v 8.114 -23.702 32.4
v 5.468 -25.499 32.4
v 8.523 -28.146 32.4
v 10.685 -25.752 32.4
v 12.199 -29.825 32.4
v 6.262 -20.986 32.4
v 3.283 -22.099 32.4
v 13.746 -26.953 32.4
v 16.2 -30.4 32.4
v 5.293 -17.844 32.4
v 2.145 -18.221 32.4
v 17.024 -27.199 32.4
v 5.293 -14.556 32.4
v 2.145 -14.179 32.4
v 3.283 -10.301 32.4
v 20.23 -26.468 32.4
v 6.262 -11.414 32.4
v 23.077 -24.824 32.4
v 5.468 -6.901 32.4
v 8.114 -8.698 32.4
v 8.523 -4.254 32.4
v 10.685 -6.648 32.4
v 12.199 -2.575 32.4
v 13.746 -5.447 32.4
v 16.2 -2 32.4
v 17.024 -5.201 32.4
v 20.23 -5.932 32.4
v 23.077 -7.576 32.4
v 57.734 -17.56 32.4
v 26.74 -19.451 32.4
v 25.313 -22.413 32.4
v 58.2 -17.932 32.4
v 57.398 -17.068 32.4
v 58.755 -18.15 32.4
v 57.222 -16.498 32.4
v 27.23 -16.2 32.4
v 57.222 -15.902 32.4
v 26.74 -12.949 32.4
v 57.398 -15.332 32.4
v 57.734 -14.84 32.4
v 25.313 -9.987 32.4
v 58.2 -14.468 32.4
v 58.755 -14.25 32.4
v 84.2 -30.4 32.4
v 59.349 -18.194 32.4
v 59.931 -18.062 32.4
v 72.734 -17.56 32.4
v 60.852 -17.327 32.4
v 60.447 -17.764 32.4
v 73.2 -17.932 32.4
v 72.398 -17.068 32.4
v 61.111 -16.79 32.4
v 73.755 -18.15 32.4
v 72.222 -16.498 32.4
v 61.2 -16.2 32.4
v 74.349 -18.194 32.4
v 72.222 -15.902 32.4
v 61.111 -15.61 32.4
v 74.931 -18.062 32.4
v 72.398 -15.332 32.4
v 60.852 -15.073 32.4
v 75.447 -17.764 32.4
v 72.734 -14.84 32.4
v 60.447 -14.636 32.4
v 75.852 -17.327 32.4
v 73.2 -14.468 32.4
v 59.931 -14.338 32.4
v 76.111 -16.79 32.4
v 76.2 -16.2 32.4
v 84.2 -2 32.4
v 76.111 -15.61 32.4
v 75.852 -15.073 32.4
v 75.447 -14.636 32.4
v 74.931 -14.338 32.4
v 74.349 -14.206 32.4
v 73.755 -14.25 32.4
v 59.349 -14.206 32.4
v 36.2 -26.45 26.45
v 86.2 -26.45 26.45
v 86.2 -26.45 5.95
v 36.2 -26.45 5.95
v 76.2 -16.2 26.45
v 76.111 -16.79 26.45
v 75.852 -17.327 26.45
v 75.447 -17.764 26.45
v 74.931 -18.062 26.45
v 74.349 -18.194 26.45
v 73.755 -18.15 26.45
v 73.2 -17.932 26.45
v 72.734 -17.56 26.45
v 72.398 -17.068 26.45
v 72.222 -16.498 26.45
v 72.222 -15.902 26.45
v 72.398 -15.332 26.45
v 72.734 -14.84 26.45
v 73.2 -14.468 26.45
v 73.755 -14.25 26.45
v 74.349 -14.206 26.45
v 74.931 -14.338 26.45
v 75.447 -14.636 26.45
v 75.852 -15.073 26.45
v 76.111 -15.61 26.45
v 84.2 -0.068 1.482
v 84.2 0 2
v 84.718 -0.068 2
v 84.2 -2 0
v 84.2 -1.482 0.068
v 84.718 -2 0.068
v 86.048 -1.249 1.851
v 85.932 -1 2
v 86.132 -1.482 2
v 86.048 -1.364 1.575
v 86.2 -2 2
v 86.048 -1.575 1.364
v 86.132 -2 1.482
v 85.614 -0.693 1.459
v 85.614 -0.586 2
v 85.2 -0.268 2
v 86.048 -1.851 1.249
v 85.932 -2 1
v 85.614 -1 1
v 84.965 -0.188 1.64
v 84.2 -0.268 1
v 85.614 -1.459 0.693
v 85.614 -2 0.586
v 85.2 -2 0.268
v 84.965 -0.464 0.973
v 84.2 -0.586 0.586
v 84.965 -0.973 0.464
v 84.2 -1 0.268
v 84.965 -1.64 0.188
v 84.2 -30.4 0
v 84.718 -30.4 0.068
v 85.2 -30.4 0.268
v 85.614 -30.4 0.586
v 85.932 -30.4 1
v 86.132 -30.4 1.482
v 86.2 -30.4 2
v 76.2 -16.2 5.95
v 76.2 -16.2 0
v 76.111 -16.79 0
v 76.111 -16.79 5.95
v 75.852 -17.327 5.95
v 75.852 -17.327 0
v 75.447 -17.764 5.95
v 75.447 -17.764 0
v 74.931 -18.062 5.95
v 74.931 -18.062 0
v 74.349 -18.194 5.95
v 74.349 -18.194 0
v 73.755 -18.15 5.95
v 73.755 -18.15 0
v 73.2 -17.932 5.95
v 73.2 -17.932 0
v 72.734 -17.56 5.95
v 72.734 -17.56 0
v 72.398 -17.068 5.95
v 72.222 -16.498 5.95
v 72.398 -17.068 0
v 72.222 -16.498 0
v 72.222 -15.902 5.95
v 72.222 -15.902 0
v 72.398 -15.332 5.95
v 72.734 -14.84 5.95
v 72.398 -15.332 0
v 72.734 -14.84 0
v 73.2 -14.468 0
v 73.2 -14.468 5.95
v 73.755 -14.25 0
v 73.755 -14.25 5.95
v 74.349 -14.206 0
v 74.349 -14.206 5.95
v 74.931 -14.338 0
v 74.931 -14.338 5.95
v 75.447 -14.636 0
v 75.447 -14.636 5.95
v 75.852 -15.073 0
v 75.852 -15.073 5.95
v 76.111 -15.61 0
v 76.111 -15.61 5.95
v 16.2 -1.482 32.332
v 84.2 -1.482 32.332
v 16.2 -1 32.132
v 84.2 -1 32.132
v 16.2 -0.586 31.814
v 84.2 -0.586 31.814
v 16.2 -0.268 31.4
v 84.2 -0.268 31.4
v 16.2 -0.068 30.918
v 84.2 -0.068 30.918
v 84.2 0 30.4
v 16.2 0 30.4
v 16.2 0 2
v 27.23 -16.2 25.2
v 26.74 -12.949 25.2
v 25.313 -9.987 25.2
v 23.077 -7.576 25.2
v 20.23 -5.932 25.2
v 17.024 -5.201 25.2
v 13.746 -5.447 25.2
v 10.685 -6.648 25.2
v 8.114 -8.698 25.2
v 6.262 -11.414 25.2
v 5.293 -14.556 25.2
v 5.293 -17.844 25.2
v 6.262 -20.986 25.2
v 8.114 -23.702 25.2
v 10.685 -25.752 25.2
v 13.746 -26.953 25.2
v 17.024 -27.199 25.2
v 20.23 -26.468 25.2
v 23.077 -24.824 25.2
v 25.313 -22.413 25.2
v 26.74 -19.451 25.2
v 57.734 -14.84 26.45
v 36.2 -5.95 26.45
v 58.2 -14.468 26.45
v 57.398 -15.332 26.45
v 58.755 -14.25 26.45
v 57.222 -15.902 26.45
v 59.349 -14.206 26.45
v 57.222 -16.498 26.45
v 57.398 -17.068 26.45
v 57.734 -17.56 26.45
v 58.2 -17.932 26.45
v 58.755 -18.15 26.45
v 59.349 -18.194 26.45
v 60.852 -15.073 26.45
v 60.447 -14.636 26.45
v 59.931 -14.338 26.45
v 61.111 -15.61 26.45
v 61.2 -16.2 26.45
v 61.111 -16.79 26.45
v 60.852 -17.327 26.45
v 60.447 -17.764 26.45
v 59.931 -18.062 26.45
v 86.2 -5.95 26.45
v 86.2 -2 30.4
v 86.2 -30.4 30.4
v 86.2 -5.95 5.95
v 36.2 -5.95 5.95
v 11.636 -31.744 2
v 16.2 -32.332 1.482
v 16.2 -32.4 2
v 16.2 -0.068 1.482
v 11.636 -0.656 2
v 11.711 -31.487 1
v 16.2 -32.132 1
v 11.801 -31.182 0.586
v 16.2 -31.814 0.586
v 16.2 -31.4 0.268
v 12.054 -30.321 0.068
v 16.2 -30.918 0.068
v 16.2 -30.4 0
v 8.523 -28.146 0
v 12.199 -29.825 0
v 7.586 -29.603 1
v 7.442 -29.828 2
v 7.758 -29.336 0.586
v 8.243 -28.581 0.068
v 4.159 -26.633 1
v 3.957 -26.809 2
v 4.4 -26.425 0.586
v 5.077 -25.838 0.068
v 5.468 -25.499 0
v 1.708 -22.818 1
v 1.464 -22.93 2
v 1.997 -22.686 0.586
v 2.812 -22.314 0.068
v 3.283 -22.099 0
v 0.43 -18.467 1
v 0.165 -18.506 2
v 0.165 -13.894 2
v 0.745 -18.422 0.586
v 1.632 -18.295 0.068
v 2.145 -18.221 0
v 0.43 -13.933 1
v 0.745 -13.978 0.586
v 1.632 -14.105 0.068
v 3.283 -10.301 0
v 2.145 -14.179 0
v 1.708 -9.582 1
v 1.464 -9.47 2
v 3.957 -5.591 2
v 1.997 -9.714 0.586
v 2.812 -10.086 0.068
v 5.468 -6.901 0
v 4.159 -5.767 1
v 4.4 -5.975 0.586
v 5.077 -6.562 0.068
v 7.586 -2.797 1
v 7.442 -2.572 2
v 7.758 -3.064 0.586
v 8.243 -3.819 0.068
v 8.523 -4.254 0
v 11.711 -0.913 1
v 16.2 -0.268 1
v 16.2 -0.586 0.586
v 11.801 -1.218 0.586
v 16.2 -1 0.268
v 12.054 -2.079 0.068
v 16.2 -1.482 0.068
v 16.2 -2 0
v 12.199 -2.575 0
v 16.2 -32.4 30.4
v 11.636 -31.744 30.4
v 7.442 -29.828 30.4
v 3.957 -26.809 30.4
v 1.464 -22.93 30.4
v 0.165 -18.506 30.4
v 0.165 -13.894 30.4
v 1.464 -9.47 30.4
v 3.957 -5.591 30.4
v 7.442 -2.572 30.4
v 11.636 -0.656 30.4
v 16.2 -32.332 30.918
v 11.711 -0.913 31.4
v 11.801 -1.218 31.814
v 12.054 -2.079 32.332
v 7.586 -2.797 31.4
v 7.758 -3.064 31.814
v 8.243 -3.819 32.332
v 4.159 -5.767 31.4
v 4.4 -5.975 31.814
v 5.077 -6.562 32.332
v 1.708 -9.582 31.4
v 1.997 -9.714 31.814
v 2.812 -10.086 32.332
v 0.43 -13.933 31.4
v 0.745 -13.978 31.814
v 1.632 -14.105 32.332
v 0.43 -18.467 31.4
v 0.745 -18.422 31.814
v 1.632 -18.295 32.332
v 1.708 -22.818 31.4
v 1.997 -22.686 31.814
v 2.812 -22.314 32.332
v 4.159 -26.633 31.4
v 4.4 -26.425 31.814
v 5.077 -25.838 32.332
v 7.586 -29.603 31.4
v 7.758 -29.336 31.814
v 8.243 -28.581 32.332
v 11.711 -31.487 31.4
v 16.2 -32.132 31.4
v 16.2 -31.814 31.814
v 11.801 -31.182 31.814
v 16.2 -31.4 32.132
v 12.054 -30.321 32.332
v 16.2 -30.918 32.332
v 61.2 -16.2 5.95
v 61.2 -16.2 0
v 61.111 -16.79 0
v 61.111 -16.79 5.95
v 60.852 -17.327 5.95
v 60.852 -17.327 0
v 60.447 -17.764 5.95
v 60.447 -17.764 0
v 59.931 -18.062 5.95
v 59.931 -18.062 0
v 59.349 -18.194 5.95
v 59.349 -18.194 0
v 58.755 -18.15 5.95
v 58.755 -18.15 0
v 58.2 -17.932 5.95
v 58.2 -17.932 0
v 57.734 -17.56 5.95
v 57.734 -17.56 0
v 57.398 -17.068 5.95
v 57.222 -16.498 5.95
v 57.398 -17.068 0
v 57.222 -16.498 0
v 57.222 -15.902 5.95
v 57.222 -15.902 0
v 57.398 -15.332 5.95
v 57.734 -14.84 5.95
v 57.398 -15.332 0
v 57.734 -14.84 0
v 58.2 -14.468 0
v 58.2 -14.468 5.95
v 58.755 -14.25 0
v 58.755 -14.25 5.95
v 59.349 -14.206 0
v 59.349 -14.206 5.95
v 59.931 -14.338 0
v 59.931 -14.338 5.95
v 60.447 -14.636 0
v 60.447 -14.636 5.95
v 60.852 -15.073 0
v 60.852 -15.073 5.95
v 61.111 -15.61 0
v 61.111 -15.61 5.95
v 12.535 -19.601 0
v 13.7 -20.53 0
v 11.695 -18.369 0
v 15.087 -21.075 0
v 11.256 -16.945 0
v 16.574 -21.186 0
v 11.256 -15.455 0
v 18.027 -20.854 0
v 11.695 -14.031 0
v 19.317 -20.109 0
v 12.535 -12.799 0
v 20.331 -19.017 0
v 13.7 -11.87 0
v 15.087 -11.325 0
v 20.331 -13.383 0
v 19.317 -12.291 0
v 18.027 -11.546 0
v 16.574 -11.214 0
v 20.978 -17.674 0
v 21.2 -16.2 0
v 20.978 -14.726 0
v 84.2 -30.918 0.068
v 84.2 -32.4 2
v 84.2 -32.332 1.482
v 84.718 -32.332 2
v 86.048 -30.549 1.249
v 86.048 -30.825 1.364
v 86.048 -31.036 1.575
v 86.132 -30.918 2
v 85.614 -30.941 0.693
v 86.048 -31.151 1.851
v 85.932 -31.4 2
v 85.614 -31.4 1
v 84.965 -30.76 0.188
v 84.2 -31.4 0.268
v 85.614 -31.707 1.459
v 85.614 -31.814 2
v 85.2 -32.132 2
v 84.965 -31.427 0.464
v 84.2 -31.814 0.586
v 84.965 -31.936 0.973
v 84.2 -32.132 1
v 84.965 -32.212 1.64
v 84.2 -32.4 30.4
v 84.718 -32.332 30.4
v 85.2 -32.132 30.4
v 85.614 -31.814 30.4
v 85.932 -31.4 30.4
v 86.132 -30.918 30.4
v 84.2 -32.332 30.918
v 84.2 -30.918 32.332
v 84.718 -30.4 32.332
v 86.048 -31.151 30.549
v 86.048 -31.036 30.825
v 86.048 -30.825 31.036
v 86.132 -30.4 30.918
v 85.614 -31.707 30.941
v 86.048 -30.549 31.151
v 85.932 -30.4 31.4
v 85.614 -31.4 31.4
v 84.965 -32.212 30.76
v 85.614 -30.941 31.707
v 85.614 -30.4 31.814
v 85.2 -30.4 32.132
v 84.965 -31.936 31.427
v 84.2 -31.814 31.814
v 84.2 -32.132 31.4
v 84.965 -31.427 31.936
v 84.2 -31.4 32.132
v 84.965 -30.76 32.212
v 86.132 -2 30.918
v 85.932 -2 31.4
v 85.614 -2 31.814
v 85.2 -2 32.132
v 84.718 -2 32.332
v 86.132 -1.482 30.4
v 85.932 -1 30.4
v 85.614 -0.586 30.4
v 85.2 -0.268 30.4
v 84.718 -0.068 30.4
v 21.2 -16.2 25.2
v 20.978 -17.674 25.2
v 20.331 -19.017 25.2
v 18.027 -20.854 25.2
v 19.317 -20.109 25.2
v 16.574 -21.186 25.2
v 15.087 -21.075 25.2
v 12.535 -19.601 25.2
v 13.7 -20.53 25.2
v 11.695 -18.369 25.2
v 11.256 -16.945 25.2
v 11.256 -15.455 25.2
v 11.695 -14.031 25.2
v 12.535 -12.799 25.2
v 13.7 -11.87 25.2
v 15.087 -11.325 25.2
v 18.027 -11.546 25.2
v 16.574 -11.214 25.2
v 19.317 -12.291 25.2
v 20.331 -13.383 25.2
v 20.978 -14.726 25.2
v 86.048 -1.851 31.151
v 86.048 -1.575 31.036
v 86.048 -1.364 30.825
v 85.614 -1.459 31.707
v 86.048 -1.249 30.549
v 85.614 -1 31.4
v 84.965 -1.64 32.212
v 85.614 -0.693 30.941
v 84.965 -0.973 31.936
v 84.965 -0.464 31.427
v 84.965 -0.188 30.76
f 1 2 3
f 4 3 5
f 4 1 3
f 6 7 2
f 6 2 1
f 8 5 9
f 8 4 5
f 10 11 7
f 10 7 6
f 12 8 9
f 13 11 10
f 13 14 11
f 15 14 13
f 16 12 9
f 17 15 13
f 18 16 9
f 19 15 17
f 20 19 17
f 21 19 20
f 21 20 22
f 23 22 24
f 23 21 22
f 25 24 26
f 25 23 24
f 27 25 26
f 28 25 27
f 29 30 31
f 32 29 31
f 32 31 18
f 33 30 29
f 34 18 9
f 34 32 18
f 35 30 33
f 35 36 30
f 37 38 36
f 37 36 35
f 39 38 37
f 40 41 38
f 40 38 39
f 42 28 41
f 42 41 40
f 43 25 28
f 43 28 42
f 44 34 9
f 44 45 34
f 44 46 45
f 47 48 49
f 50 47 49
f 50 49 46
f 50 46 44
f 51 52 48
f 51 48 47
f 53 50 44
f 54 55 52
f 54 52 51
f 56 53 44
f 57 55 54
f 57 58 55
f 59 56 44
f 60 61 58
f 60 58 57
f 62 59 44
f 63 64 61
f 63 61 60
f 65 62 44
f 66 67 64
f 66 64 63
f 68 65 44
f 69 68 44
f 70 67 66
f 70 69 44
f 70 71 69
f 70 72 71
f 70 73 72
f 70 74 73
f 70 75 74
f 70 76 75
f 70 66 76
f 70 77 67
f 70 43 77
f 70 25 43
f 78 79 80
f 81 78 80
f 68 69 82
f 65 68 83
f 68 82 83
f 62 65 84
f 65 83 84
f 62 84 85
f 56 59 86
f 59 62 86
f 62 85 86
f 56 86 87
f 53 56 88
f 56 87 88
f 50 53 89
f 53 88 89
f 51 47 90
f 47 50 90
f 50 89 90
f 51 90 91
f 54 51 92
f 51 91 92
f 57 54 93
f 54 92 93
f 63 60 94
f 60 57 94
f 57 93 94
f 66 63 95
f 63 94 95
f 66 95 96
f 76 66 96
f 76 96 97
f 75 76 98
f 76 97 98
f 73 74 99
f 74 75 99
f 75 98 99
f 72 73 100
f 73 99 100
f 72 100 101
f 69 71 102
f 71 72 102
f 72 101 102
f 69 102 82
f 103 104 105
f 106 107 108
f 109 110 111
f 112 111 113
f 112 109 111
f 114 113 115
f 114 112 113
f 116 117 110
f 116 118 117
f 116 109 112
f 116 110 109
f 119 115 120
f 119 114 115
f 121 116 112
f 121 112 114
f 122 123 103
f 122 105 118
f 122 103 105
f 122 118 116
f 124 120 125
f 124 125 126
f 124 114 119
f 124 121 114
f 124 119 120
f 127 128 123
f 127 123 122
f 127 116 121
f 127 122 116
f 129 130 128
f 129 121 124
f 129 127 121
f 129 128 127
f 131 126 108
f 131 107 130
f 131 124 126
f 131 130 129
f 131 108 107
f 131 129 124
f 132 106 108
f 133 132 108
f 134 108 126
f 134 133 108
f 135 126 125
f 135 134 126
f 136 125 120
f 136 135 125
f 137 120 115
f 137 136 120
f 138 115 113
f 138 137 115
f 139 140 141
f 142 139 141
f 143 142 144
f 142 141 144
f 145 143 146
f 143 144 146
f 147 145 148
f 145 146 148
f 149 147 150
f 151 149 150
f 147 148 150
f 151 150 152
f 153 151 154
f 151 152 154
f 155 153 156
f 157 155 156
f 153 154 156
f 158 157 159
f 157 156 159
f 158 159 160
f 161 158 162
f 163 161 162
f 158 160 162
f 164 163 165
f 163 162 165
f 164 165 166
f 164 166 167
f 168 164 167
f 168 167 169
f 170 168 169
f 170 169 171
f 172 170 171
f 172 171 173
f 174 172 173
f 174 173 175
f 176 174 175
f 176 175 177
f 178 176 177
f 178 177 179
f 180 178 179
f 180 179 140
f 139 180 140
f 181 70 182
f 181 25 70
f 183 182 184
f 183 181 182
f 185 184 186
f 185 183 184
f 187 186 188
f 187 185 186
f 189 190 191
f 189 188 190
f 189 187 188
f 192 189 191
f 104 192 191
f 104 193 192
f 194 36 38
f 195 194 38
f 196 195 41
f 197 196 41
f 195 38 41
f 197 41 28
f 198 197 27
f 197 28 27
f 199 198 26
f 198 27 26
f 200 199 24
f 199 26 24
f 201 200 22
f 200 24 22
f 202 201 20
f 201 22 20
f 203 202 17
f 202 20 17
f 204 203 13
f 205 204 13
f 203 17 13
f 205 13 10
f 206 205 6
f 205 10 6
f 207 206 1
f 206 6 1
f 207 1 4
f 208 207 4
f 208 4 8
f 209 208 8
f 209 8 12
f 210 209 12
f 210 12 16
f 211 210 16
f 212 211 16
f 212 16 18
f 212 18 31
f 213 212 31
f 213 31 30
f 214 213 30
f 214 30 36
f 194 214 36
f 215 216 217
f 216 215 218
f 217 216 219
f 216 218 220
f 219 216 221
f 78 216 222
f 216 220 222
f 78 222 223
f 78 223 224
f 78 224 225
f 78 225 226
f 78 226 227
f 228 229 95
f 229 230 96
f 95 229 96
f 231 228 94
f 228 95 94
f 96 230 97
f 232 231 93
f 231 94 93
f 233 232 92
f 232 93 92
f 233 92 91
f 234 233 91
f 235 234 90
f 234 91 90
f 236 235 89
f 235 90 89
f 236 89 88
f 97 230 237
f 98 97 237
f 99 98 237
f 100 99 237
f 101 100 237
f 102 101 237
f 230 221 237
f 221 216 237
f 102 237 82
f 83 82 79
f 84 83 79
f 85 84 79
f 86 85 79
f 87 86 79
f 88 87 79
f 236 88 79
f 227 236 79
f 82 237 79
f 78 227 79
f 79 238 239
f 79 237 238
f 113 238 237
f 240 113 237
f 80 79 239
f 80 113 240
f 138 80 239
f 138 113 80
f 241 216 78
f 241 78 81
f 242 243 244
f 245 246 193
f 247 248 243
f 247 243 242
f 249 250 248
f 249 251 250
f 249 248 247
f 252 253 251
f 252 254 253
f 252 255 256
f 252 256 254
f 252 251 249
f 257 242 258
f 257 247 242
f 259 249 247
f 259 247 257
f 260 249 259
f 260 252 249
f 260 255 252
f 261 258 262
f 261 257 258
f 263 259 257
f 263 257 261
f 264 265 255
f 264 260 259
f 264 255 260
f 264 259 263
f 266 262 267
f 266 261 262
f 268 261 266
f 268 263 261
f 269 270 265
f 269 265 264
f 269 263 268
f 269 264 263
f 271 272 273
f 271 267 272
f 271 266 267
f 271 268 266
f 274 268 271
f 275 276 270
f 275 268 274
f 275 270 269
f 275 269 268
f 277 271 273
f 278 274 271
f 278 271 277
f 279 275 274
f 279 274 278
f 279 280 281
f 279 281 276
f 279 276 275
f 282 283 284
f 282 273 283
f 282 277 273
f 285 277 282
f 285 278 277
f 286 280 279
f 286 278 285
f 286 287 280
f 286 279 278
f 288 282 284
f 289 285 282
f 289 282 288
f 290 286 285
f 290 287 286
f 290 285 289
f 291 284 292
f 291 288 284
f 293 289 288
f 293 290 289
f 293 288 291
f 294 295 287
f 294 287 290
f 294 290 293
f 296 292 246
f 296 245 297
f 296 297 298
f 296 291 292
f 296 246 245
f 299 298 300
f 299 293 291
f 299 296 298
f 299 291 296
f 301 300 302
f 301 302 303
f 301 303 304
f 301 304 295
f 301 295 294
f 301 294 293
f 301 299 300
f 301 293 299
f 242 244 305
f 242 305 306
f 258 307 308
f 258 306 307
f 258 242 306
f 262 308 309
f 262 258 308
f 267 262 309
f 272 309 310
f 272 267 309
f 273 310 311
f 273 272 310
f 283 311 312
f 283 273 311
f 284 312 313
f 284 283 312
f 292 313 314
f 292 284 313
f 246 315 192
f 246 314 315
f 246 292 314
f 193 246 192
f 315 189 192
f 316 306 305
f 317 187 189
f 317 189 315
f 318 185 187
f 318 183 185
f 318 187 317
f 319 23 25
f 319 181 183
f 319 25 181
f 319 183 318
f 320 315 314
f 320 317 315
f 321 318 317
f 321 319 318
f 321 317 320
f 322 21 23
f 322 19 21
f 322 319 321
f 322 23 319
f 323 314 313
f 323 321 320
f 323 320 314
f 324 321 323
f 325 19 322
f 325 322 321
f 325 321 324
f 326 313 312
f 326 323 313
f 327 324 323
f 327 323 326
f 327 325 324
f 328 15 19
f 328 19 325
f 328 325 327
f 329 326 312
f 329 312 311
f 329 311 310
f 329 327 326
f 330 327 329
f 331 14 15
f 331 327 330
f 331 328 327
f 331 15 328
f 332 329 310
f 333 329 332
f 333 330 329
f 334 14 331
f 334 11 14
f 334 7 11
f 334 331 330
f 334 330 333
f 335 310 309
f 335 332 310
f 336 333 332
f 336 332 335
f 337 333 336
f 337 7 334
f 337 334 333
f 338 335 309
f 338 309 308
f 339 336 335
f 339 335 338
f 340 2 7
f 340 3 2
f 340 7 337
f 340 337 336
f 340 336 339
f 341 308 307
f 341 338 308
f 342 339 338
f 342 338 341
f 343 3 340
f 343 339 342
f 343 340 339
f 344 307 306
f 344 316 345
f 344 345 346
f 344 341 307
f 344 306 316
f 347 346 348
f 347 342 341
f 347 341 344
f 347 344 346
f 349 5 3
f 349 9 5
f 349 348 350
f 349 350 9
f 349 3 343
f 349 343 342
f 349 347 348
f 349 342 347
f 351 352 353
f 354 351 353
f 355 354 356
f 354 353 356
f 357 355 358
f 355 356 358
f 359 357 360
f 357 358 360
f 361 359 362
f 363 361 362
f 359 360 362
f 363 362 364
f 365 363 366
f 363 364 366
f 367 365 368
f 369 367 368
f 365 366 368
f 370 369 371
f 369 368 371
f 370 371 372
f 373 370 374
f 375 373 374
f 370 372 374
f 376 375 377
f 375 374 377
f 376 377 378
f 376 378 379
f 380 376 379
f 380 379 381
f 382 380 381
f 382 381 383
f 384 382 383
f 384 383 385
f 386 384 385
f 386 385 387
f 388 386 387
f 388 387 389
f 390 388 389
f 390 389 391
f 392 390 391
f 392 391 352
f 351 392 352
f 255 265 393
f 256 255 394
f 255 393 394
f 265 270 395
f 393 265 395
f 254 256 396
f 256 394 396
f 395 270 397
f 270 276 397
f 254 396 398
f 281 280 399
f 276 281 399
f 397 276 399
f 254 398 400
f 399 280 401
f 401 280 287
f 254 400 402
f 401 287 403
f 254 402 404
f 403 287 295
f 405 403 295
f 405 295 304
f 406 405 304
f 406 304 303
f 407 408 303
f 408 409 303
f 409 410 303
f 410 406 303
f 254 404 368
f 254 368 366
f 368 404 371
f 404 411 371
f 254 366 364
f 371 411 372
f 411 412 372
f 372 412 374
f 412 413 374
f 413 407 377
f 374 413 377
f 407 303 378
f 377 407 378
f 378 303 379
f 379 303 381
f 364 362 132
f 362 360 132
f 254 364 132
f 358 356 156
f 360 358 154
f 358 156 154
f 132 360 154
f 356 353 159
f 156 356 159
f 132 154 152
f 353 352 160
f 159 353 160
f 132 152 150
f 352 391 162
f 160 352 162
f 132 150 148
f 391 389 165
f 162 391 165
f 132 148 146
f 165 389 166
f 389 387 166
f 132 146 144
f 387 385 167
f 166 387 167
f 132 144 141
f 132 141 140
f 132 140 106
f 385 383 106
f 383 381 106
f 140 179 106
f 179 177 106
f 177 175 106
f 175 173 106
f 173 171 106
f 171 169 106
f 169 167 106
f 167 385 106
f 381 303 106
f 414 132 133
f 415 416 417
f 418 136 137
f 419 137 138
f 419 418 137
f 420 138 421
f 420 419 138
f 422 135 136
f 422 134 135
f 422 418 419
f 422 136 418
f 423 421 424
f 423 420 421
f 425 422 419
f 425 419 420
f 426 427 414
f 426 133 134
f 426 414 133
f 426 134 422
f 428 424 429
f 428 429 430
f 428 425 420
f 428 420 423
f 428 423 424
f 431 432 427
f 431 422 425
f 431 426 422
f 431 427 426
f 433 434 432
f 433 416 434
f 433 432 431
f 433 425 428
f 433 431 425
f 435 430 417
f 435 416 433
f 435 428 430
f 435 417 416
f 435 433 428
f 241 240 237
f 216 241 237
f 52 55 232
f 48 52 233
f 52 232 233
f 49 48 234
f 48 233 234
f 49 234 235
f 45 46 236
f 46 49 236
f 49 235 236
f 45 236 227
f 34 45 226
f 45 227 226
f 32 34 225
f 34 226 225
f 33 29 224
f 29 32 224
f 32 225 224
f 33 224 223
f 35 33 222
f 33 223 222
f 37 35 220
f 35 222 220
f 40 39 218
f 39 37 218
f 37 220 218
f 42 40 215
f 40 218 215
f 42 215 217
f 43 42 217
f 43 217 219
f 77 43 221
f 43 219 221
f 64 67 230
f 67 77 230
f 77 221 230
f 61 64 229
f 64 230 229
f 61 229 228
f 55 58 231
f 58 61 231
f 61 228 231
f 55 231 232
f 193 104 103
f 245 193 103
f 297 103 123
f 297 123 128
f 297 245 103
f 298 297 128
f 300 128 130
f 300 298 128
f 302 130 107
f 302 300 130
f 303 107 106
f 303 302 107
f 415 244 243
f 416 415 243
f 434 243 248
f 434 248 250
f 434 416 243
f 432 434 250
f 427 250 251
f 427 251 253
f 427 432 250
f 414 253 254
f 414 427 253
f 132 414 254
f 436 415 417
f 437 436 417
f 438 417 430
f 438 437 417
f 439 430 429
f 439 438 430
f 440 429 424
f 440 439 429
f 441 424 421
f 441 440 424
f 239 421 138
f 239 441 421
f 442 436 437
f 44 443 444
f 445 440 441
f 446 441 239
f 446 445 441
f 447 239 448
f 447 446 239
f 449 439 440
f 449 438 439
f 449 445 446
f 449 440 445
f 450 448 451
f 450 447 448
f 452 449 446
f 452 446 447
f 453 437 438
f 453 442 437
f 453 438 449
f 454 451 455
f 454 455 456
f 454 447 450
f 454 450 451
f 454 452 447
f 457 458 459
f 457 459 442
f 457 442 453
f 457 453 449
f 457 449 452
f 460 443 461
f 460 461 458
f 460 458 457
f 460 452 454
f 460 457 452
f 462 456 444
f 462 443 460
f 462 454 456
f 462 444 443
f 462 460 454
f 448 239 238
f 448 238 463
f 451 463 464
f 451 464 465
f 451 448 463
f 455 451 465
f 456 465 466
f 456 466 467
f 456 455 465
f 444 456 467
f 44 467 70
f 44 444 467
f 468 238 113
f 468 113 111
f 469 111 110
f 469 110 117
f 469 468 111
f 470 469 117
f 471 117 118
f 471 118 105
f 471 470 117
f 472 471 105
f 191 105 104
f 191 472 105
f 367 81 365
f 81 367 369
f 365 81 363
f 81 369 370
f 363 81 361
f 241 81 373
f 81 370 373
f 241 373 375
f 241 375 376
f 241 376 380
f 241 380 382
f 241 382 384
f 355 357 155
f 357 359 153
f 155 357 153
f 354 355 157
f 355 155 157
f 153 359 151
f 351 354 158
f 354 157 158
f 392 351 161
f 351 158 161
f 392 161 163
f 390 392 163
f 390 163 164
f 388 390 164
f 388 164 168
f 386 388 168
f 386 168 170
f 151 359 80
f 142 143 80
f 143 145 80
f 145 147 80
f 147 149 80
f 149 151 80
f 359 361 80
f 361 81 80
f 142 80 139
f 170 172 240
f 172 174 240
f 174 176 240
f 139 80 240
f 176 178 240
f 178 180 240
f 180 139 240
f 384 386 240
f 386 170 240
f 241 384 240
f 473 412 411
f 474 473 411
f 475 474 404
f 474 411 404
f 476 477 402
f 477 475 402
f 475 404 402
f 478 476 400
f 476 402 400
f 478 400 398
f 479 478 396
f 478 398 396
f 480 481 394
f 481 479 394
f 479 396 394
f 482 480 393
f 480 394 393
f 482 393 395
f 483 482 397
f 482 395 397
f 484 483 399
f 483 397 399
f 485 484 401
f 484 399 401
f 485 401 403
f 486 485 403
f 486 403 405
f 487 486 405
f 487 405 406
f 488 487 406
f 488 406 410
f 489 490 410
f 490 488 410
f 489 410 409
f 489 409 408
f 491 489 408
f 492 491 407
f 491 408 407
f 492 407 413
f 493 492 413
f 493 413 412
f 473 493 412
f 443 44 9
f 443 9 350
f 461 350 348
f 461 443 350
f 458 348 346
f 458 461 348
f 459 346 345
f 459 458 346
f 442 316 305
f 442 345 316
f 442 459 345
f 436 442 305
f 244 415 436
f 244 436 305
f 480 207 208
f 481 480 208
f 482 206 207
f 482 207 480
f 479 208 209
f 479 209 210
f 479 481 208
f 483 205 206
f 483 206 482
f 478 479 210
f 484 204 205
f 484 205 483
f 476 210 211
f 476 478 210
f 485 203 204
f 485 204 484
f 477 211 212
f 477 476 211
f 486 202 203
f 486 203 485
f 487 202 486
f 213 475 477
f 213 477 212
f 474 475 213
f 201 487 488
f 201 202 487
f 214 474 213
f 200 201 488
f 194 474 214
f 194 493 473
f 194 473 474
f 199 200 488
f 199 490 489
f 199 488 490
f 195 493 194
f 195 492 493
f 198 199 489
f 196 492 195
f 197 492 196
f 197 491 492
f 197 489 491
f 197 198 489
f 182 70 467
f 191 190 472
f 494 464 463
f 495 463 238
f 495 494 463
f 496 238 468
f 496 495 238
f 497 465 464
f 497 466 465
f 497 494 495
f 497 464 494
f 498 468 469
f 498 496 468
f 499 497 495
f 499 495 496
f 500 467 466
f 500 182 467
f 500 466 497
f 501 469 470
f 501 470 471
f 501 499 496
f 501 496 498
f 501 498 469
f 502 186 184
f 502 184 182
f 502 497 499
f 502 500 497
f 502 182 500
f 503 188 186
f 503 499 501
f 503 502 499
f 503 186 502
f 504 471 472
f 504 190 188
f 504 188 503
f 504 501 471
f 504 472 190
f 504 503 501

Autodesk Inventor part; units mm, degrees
ref_plane "YZ Plane" through (0, 0, 0) normal (1, 0, 0) x (0, 1, 0)
ref_plane "XZ Plane" through (0, 0, 0) normal (0, 1, 0) x (-1, 0, 0)
ref_plane "XY Plane" through (0, 0, 0) normal (0, 0, 1) x (1, 0, 0)
sketch "Sketch1" plane through (0, 0, 0) normal (0, 0, 1) x (1, 0, 0)
  line L0 (16.2, 0) -> (86.2, 0)
  line L1 (86.2, 0) -> (86.2, -32.4)
  line L2 (86.2, -32.4) -> (16.2, -32.4)
  circle A0 centre (16.2, -16.2) radius 5
  circle A1 centre (59.2, -16.2) radius 2
  circle A2 centre (74.2, -16.2) radius 2
  arc A3 (16.2, 0) -> (16.2, -32.4) centre (16.2, -16.2) ccw
  point P0 (0, 0)
  dimension "d1" = 32.4
  dimension "d2" = 10
  dimension "d4" = 16.2
  dimension "d5" = 4
  dimension "d6" = 43
  dimension "d7" = 4
  dimension "d8" = 15
  dimension "d9" = 32.4
extrude "Extrusion1" add sketch "Sketch1" along normal blind 32.4
sketch "Sketch2" plane through (86.2, -32.4, 0) normal (1, 0, 0) x (0, 0, -1)
  line L0 (0, 32.4) -> (-32.4, 32.4) projected
  line L1 (0, 0) -> (0, 32.4) projected
  line L2 (-26.45, 5.95) -> (-5.95, 5.95)
  line L3 (-5.95, 5.95) -> (-5.95, 26.45)
  line L4 (-5.95, 26.45) -> (-26.45, 26.45)
  line L5 (-26.45, 26.45) -> (-26.45, 5.95)
  line L6 (-26.45, 5.95) -> (-5.95, 26.45) construction
  line L7 (-5.95, 5.95) -> (-26.45, 26.45) construction
  dimension "d12" = 20.5
  dimension "d13" = 20.5
extrude "Extrusion2" cut sketch "Sketch2" against normal blind 50
sketch "Sketch3" plane through (0, 0, 32.4) normal (0, 0, 1) x (1, 0, 0)
  circle A0 centre (16.2, -16.2) radius 5 projected
  circle A1 centre (16.2, -16.2) radius 11.03
  point P0 (0, 0)
  dimension "d16" = 22.06
extrude "Extrusion3" cut sketch "Sketch3" against normal blind 7.2
fillet "Fillet1" radius 2 10 edges at (0, -16.2, 32.4) (51.2, -32.4, 32.4) (51.2, 0, 32.4) (0, -16.2, 0) (51.2, -32.4, 0) (51.2, 0, 0) (86.2, 0, 16.2) (86.2, -16.2, 32.4) (86.2, -16.2, 0) (86.2, -32.4, 16.2)
properties part number "băng chuyền"
